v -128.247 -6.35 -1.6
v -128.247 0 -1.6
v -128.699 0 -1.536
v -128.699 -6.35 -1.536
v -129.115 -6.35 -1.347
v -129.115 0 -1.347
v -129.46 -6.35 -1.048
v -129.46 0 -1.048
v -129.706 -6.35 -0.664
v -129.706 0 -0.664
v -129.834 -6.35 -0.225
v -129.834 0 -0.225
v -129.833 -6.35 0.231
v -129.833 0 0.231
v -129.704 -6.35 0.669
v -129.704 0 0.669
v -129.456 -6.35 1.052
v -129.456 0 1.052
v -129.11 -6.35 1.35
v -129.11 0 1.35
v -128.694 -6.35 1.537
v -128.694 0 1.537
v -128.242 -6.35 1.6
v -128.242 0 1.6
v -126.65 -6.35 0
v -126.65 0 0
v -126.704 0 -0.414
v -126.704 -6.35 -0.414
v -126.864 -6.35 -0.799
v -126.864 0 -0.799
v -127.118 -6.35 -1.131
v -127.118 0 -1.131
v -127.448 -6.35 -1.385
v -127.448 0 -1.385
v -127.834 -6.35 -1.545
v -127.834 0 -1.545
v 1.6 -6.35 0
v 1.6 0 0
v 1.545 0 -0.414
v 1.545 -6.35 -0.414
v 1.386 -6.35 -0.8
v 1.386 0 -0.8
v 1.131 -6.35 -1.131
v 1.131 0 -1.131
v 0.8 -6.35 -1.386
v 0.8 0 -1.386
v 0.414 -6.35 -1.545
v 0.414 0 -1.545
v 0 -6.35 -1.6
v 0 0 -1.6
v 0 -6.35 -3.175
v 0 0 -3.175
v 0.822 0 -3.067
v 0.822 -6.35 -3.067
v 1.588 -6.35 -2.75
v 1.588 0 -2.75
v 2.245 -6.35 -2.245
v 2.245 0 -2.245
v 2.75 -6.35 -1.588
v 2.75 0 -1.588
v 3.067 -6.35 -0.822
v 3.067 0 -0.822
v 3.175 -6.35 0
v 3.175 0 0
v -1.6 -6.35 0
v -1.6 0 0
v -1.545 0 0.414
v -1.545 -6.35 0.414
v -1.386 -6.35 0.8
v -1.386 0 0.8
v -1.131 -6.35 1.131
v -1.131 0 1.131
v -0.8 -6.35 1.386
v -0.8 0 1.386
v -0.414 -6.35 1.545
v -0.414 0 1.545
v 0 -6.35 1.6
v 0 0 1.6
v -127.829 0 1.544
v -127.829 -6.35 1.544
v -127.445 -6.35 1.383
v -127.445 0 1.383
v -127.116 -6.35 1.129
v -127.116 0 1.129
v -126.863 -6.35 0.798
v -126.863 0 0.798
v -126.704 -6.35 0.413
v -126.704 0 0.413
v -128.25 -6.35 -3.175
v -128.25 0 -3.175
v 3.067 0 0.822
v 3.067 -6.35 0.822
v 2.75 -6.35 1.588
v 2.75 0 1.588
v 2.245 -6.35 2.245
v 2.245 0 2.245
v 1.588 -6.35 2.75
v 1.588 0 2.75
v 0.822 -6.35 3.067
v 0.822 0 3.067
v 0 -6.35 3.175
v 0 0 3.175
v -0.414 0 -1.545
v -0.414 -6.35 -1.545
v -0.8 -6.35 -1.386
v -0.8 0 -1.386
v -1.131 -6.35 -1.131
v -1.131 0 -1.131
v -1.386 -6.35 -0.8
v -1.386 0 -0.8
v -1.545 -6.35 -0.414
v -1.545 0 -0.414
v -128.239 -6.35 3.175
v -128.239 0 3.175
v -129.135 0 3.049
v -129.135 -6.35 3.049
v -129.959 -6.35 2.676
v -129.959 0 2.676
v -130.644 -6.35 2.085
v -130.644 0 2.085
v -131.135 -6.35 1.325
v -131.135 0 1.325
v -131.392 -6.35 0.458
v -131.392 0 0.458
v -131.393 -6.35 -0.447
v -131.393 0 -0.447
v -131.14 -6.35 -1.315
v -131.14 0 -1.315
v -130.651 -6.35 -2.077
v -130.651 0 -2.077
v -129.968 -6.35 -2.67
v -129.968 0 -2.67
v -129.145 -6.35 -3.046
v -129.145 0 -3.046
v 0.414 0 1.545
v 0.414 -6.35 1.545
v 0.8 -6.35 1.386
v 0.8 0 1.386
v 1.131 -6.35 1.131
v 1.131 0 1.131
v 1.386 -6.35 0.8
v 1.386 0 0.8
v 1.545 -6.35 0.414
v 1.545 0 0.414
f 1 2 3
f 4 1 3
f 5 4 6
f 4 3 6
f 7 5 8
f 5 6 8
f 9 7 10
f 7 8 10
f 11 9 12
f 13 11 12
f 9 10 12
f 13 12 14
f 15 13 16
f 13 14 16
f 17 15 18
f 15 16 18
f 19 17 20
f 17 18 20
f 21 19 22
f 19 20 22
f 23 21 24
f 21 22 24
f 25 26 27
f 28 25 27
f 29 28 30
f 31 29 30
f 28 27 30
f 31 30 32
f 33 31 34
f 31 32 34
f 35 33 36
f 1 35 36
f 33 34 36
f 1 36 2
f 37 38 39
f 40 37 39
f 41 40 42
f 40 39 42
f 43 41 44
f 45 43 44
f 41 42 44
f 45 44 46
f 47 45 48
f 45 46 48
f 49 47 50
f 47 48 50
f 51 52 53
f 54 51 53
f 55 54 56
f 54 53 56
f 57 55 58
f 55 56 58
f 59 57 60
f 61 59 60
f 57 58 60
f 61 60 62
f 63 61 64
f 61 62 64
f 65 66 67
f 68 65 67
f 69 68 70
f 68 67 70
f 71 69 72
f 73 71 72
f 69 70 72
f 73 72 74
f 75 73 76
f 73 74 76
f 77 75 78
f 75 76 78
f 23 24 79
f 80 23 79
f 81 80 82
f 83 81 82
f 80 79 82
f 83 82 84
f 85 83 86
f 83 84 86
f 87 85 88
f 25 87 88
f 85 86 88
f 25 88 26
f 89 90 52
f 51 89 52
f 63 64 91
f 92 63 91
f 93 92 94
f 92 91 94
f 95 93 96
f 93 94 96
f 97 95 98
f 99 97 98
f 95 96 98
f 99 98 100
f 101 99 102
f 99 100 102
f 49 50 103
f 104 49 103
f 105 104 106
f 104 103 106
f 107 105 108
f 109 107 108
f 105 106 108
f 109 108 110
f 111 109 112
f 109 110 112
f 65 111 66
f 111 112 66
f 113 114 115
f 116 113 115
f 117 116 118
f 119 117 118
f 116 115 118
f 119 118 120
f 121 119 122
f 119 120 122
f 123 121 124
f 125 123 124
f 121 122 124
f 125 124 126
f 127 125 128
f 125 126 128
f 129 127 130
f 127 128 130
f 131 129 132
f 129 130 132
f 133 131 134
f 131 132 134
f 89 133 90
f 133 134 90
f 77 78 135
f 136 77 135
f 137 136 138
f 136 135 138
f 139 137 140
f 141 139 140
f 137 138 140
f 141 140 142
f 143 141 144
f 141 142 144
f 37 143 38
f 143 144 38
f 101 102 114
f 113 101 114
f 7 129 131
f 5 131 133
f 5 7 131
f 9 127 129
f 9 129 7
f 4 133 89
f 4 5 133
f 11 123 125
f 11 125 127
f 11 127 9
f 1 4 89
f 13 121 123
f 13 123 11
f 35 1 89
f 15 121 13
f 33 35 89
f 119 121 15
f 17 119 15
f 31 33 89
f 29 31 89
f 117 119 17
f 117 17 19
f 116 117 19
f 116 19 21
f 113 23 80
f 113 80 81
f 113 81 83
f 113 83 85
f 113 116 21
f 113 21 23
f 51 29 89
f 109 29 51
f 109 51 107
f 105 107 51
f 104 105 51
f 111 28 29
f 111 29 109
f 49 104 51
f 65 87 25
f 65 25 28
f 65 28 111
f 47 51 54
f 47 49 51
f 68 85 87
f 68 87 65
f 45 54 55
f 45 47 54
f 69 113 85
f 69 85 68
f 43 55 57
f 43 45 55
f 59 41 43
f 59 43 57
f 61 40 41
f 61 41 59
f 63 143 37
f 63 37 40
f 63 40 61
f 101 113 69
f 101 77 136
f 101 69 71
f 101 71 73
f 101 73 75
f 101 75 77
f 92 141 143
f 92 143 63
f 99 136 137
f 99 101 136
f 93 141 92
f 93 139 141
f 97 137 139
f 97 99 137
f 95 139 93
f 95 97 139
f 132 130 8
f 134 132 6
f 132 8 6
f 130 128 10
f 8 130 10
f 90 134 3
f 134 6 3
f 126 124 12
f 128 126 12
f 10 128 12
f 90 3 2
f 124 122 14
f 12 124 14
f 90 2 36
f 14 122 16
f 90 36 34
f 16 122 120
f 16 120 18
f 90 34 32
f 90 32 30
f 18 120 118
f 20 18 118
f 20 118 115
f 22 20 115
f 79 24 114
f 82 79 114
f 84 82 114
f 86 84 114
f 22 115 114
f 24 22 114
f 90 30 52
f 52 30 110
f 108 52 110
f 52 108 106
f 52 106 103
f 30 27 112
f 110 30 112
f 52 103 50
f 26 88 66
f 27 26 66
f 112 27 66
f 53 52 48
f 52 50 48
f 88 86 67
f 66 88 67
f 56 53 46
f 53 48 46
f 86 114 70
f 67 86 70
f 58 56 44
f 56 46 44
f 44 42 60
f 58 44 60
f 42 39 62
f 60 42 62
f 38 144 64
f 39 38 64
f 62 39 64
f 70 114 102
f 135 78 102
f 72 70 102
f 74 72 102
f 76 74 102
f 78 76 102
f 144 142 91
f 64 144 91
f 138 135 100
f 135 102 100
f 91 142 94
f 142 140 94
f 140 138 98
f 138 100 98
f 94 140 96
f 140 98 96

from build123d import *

# Parameters (mm, degrees)
F1_DEPTH = 6.35


with BuildPart() as f1:
    # F0 (on Front) → F1 (new body)
    with BuildSketch(Plane.XZ):
        with BuildLine():
            ThreePointArc((0, 1.6), (1.1313708499, 1.1313708499), (1.6, 0))
            ThreePointArc((1.6, 0), (1.1313708499, -1.1313708499), (0, -1.6))
            Line((0, -1.6), (0, -3.175))
            ThreePointArc((0, -3.175), (2.2450640303, -2.2450640303), (3.175, 0))
            ThreePointArc((3.175, 0), (2.2450640303, 2.2450640303), (0, 3.175))
            Line((0, 3.175), (0, 1.6))
        make_face()
        with BuildLine():
            ThreePointArc((-1.6, 0), (-1.1313708499, 1.1313708499), (0, 1.6))
            Line((0, 1.6), (0, 3.175))
            ThreePointArc((0, 3.175), (-2.2450640303, 2.2450640303), (-3.175, 0))
            Line((-3.175, 0), (-1.6, 0))
        make_face()
        with BuildLine():
            Line((0, -3.175), (0, -1.6))
            ThreePointArc((0, -1.6), (-1.1313708499, -1.1313708499), (-1.6, 0))
            Line((-1.6, 0), (-3.175, 0))
            ThreePointArc((-3.175, 0), (-2.2450640303, -2.2450640303), (0, -3.175))
        make_face()
        with BuildLine():
            ThreePointArc((-3.175, 0), (-2.2450640303, 2.2450640303), (0, 3.175))
            Line((0, 3.175), (-128.2390823674, 3.1749812291))
            ThreePointArc((-128.2390823674, 3.1749812291), (-126.0010793162, 2.2412007403), (-125.075, 0))
            Line((-125.075, 0), (-3.175, 0))
        make_face()
        with BuildLine():
            Line((-128.25, -3.175), (0, -3.175))
            ThreePointArc((0, -3.175), (-2.2450640303, -2.2450640303), (-3.175, 0))
            Line((-3.175, 0), (-125.075, 0))
            ThreePointArc((-125.075, 0), (-126.0049359697, -2.2450640303), (-128.25, -3.175))
        make_face()
        with BuildLine():
            Line((-128.2417899522, 1.6001789385), (-128.2390823674, 3.1749812291))
            ThreePointArc((-128.2390823674, 3.1749812291), (-131.4249953073, 0.0054588244), (-128.25, -3.175))
            Line((-128.25, -3.175), (-128.2472924152, -1.6001977093))
            ThreePointArc((-128.2472924152, -1.6001977093), (-129.8501976349, 0.0027512475), (-128.2417899522, 1.6001789385))
        make_face()
        with BuildLine():
            ThreePointArc((-125.075, 0), (-126.0010793162, 2.2412007403), (-128.2390823674, 3.1749812291))
            Line((-128.2390823674, 3.1749812291), (-128.2417899522, 1.6001789385))
            ThreePointArc((-128.2417899522, 1.6001789385), (-127.1155887521, 1.1286058483), (-126.6498, 0))
            Line((-126.6498, 0), (-125.075, 0))
        make_face()
        with BuildLine():
            Line((-128.2472924152, -1.6001977093), (-128.25, -3.175))
            ThreePointArc((-128.25, -3.175), (-126.0049359697, -2.2450640303), (-125.075, 0))
            Line((-125.075, 0), (-126.6498, 0))
            ThreePointArc((-126.6498, 0), (-127.1175308575, -1.1305545902), (-128.2472924152, -1.6001977093))
        make_face()
    extrude(amount=F1_DEPTH)


solid = f1.part
